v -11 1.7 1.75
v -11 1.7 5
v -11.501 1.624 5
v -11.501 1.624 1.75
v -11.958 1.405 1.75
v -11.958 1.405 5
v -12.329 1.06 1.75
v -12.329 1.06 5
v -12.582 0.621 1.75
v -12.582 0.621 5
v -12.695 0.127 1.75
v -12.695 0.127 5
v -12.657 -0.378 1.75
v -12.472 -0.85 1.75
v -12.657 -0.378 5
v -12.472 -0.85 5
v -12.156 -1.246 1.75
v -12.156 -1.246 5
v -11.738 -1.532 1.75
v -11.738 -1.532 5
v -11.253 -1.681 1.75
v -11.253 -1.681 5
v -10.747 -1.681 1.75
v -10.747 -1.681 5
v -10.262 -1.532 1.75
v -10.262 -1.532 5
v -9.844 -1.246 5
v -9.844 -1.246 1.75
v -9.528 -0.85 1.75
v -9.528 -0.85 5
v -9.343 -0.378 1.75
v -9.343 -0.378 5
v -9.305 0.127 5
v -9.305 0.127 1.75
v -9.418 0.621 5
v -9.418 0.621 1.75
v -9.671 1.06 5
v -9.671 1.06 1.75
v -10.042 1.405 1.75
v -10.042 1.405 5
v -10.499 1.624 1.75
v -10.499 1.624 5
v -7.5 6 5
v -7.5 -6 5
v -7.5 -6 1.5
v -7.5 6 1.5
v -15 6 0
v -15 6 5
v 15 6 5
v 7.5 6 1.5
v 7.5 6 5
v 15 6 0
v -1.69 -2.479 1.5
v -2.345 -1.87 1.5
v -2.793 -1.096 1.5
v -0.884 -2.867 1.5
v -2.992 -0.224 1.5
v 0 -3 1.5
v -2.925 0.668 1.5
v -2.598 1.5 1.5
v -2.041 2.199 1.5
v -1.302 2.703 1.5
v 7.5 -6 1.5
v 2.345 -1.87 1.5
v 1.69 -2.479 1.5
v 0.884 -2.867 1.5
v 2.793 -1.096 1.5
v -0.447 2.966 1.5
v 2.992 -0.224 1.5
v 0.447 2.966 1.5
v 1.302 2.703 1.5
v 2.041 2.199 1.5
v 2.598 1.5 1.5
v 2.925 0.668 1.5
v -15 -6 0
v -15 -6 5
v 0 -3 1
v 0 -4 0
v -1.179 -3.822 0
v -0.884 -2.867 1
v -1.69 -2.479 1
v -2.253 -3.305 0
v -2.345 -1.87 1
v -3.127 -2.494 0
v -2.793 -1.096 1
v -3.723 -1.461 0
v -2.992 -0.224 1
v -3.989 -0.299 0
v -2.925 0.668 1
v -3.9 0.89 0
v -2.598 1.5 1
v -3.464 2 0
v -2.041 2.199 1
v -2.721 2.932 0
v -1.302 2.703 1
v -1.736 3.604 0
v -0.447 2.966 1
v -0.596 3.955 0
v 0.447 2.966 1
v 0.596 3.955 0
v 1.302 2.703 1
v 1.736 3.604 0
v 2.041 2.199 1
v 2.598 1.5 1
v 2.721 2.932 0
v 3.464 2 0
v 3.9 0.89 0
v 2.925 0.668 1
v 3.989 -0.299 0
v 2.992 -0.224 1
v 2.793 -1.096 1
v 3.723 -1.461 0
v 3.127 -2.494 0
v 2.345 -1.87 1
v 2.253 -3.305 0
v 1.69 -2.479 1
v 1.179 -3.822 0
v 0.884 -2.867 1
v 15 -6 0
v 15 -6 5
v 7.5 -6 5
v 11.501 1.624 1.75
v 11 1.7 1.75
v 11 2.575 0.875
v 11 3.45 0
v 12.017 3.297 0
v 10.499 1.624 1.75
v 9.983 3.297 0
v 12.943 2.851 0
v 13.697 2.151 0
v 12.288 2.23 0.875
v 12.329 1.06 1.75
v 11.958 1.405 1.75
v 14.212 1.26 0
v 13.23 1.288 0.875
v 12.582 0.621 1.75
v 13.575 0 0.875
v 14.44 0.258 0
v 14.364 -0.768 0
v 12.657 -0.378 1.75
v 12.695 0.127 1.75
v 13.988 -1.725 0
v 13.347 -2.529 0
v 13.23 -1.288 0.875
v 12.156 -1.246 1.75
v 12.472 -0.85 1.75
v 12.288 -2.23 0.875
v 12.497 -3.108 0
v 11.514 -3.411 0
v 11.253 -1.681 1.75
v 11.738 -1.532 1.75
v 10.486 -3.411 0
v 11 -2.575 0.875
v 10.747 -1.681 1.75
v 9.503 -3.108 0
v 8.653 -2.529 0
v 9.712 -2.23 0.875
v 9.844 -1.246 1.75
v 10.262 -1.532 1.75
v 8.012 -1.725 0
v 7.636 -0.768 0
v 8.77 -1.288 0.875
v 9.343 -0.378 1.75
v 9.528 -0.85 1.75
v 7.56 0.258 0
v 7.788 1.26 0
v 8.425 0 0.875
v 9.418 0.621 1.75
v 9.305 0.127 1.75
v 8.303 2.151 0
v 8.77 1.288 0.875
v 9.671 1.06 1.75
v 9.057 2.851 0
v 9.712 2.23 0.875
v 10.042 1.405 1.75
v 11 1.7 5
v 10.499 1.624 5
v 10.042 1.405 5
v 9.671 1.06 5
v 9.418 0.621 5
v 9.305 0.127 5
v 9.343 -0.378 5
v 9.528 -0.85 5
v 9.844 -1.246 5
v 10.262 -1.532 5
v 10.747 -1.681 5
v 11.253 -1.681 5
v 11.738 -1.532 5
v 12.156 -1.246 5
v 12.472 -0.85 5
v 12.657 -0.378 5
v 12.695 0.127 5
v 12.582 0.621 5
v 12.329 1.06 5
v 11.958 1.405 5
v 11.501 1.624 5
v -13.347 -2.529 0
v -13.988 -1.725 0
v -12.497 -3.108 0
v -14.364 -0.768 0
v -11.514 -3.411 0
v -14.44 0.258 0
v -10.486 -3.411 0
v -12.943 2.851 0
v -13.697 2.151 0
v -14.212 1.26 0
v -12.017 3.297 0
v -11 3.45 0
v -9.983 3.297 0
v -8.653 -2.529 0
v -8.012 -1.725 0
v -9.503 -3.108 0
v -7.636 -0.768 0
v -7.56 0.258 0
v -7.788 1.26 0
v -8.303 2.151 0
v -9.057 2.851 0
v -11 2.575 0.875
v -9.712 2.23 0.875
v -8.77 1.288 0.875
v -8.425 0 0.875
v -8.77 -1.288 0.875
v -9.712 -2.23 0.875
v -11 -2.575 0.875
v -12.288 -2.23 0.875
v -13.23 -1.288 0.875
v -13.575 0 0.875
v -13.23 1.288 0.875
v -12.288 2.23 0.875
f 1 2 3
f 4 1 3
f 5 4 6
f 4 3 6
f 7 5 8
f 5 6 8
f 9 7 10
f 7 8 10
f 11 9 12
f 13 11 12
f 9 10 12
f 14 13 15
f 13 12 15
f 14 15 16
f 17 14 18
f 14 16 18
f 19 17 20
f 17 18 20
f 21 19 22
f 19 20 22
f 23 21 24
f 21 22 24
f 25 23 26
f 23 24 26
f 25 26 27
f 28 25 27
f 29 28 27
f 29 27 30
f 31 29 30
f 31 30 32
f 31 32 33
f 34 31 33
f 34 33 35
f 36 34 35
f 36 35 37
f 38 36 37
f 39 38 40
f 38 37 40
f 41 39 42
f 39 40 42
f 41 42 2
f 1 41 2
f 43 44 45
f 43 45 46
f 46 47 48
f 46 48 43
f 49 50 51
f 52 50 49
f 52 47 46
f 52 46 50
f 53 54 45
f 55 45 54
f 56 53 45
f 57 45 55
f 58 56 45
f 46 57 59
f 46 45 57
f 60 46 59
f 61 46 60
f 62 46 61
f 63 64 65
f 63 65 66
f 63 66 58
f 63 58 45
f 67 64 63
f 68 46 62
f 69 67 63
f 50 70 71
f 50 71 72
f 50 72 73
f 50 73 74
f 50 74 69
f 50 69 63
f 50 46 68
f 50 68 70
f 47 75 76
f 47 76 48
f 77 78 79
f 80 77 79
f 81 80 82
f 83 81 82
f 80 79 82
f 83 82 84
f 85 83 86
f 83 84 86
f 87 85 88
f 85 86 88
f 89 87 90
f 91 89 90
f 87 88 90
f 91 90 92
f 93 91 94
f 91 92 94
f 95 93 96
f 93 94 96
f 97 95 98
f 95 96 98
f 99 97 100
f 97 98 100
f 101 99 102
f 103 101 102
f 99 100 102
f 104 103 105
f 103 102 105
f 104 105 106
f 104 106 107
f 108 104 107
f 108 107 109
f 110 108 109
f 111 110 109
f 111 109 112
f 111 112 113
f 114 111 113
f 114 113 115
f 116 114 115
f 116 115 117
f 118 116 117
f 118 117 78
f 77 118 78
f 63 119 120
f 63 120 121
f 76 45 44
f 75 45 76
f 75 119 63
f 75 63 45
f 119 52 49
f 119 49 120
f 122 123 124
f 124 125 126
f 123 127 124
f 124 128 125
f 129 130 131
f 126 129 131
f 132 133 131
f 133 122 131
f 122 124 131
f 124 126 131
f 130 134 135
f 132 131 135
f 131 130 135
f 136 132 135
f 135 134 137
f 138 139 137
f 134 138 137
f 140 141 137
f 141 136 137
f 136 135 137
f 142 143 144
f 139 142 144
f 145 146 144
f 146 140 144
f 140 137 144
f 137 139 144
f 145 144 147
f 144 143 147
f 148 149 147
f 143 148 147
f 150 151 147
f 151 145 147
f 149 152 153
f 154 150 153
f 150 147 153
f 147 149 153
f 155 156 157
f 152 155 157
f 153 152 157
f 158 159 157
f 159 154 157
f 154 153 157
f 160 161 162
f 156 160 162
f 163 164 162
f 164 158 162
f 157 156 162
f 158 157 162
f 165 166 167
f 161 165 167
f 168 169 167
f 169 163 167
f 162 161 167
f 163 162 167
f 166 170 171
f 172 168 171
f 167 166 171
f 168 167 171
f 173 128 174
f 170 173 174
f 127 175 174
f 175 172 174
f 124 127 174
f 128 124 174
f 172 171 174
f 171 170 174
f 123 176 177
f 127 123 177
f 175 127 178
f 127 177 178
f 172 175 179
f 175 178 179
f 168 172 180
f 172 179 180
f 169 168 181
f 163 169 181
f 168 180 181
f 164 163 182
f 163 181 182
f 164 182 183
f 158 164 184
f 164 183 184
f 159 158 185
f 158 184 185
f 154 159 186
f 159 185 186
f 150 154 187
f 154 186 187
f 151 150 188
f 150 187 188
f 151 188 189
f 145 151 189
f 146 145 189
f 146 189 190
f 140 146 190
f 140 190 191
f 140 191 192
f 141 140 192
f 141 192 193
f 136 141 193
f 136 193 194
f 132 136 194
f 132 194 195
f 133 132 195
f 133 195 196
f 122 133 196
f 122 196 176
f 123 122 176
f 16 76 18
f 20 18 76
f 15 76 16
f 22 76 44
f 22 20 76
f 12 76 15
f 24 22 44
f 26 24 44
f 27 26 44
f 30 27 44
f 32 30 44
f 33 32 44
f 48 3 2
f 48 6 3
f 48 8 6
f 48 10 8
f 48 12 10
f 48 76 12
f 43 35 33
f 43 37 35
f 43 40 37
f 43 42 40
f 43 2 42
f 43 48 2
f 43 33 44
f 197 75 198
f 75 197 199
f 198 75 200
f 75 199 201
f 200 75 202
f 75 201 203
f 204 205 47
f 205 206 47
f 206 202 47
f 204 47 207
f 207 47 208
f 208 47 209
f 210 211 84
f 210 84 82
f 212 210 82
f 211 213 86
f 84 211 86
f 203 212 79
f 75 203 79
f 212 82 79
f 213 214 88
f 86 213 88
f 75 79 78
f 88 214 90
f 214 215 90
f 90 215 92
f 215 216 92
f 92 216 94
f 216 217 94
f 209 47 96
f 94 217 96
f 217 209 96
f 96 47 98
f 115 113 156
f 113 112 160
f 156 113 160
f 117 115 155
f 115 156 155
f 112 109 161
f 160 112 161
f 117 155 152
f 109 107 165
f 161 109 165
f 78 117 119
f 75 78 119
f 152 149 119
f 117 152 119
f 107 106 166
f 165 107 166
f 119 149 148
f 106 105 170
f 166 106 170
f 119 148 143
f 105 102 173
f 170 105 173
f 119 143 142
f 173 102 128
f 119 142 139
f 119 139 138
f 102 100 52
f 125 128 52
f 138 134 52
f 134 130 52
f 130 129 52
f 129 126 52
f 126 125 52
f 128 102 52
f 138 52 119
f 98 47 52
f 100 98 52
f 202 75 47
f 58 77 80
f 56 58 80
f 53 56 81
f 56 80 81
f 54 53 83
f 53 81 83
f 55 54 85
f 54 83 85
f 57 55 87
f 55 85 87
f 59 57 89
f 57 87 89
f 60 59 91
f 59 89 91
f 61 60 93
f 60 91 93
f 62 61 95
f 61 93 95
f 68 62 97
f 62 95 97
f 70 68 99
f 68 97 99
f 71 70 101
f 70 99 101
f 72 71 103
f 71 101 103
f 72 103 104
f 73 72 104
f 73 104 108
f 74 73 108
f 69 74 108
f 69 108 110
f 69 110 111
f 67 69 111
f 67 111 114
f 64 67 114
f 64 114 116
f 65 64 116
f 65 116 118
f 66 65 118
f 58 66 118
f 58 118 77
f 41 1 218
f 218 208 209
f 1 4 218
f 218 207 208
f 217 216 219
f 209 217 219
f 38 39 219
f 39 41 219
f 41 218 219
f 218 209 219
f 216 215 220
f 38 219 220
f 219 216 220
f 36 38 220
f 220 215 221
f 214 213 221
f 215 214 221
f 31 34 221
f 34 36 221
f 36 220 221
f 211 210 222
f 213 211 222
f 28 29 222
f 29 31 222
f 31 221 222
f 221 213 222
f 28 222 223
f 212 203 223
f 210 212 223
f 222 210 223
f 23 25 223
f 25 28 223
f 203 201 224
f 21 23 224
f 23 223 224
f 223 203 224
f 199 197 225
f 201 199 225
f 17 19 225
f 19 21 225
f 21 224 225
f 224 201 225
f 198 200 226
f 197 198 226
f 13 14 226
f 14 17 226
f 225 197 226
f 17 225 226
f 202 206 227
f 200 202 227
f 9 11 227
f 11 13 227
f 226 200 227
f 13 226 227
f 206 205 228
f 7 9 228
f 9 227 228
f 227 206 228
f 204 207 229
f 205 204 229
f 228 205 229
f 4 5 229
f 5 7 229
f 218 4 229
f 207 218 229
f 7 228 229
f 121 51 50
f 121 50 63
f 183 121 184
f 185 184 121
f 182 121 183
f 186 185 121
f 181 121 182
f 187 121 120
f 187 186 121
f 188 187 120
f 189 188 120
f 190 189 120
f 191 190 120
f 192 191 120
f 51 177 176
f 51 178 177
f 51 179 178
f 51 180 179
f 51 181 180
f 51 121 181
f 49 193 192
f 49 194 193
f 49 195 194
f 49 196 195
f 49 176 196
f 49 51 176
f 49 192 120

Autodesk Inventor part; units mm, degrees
ref_plane "YZ Plane" through (0, 0, 0) normal (1, 0, 0) x (0, 1, 0)
ref_plane "XZ Plane" through (0, 0, 0) normal (0, 1, 0) x (-1, 0, 0)
ref_plane "XY Plane" through (0, 0, 0) normal (0, 0, 1) x (1, 0, 0)
sketch "Skizze1" plane through (0, 0, 0) normal (0, 0, 1) x (1, 0, 0)
  line L0 (-21, 0) -> (21, 0) projected
  line L1 (0, -8.4) -> (0, 8.4) projected
  line L2 (-15, 6) -> (15, 6)
  line L3 (15, 6) -> (15, -6)
  line L4 (15, -6) -> (-15, -6)
  line L5 (-15, -6) -> (-15, 6)
  point P0 (0, 0)
  dimension "d0" = 12
  dimension "d1" = 30
extrude "Extrusion1" add sketch "Skizze1" along normal blind 5
sketch "Skizze2" plane through (0, 0, 5) normal (0, 0, 1) x (1, 0, 0)
  line L0 (15, 6) -> (-15, 6) projected
  line L1 (-15, -6) -> (15, -6) projected
  line L2 (-21, 0) -> (21, 0) projected
  line L3 (0, -8.4) -> (0, 8.4) projected
  line L4 (-7.5, 6) -> (7.5, 6)
  line L5 (7.5, 6) -> (7.5, -6)
  line L6 (7.5, -6) -> (-7.5, -6)
  line L7 (-7.5, -6) -> (-7.5, 6)
  point P0 (0, 0)
  dimension "d4" = 15
extrude "Extrusion2" cut sketch "Skizze2" against normal blind 3.5
sketch "Skizze3" plane through (0, 0, 0) normal (0, 0, -1) x (-1, 0, 0)
  line L0 (21, 0) -> (-21, 0) projected
  line L1 (0, -8.4) -> (0, 8.4) projected
  point P0 (0, 0)
  point P1 (-11, 0)
  point P2 (11, 0)
  dimension "d7" = 22
hole "Bohrung1" at (11, 0, 0) at (-11, 0, 0) direction (0, 0, 1) diameter 3.4 end through all countersink diameter 6.9 countersink angle 90
sketch "Skizze4" plane through (0, 0, 1.5) normal (0, 0, 1) x (1, 0, 0)
  point P0 (0, 0)
  point P1 (0, 0)
hole "Bohrung2" at (0, 0, 1.5) direction (0, 0, -1) diameter 6 end through all
chamfer "Fase1" distance 1 angle 45 1 edges at (0, 3, 0)
properties part number "13_1087_037"
